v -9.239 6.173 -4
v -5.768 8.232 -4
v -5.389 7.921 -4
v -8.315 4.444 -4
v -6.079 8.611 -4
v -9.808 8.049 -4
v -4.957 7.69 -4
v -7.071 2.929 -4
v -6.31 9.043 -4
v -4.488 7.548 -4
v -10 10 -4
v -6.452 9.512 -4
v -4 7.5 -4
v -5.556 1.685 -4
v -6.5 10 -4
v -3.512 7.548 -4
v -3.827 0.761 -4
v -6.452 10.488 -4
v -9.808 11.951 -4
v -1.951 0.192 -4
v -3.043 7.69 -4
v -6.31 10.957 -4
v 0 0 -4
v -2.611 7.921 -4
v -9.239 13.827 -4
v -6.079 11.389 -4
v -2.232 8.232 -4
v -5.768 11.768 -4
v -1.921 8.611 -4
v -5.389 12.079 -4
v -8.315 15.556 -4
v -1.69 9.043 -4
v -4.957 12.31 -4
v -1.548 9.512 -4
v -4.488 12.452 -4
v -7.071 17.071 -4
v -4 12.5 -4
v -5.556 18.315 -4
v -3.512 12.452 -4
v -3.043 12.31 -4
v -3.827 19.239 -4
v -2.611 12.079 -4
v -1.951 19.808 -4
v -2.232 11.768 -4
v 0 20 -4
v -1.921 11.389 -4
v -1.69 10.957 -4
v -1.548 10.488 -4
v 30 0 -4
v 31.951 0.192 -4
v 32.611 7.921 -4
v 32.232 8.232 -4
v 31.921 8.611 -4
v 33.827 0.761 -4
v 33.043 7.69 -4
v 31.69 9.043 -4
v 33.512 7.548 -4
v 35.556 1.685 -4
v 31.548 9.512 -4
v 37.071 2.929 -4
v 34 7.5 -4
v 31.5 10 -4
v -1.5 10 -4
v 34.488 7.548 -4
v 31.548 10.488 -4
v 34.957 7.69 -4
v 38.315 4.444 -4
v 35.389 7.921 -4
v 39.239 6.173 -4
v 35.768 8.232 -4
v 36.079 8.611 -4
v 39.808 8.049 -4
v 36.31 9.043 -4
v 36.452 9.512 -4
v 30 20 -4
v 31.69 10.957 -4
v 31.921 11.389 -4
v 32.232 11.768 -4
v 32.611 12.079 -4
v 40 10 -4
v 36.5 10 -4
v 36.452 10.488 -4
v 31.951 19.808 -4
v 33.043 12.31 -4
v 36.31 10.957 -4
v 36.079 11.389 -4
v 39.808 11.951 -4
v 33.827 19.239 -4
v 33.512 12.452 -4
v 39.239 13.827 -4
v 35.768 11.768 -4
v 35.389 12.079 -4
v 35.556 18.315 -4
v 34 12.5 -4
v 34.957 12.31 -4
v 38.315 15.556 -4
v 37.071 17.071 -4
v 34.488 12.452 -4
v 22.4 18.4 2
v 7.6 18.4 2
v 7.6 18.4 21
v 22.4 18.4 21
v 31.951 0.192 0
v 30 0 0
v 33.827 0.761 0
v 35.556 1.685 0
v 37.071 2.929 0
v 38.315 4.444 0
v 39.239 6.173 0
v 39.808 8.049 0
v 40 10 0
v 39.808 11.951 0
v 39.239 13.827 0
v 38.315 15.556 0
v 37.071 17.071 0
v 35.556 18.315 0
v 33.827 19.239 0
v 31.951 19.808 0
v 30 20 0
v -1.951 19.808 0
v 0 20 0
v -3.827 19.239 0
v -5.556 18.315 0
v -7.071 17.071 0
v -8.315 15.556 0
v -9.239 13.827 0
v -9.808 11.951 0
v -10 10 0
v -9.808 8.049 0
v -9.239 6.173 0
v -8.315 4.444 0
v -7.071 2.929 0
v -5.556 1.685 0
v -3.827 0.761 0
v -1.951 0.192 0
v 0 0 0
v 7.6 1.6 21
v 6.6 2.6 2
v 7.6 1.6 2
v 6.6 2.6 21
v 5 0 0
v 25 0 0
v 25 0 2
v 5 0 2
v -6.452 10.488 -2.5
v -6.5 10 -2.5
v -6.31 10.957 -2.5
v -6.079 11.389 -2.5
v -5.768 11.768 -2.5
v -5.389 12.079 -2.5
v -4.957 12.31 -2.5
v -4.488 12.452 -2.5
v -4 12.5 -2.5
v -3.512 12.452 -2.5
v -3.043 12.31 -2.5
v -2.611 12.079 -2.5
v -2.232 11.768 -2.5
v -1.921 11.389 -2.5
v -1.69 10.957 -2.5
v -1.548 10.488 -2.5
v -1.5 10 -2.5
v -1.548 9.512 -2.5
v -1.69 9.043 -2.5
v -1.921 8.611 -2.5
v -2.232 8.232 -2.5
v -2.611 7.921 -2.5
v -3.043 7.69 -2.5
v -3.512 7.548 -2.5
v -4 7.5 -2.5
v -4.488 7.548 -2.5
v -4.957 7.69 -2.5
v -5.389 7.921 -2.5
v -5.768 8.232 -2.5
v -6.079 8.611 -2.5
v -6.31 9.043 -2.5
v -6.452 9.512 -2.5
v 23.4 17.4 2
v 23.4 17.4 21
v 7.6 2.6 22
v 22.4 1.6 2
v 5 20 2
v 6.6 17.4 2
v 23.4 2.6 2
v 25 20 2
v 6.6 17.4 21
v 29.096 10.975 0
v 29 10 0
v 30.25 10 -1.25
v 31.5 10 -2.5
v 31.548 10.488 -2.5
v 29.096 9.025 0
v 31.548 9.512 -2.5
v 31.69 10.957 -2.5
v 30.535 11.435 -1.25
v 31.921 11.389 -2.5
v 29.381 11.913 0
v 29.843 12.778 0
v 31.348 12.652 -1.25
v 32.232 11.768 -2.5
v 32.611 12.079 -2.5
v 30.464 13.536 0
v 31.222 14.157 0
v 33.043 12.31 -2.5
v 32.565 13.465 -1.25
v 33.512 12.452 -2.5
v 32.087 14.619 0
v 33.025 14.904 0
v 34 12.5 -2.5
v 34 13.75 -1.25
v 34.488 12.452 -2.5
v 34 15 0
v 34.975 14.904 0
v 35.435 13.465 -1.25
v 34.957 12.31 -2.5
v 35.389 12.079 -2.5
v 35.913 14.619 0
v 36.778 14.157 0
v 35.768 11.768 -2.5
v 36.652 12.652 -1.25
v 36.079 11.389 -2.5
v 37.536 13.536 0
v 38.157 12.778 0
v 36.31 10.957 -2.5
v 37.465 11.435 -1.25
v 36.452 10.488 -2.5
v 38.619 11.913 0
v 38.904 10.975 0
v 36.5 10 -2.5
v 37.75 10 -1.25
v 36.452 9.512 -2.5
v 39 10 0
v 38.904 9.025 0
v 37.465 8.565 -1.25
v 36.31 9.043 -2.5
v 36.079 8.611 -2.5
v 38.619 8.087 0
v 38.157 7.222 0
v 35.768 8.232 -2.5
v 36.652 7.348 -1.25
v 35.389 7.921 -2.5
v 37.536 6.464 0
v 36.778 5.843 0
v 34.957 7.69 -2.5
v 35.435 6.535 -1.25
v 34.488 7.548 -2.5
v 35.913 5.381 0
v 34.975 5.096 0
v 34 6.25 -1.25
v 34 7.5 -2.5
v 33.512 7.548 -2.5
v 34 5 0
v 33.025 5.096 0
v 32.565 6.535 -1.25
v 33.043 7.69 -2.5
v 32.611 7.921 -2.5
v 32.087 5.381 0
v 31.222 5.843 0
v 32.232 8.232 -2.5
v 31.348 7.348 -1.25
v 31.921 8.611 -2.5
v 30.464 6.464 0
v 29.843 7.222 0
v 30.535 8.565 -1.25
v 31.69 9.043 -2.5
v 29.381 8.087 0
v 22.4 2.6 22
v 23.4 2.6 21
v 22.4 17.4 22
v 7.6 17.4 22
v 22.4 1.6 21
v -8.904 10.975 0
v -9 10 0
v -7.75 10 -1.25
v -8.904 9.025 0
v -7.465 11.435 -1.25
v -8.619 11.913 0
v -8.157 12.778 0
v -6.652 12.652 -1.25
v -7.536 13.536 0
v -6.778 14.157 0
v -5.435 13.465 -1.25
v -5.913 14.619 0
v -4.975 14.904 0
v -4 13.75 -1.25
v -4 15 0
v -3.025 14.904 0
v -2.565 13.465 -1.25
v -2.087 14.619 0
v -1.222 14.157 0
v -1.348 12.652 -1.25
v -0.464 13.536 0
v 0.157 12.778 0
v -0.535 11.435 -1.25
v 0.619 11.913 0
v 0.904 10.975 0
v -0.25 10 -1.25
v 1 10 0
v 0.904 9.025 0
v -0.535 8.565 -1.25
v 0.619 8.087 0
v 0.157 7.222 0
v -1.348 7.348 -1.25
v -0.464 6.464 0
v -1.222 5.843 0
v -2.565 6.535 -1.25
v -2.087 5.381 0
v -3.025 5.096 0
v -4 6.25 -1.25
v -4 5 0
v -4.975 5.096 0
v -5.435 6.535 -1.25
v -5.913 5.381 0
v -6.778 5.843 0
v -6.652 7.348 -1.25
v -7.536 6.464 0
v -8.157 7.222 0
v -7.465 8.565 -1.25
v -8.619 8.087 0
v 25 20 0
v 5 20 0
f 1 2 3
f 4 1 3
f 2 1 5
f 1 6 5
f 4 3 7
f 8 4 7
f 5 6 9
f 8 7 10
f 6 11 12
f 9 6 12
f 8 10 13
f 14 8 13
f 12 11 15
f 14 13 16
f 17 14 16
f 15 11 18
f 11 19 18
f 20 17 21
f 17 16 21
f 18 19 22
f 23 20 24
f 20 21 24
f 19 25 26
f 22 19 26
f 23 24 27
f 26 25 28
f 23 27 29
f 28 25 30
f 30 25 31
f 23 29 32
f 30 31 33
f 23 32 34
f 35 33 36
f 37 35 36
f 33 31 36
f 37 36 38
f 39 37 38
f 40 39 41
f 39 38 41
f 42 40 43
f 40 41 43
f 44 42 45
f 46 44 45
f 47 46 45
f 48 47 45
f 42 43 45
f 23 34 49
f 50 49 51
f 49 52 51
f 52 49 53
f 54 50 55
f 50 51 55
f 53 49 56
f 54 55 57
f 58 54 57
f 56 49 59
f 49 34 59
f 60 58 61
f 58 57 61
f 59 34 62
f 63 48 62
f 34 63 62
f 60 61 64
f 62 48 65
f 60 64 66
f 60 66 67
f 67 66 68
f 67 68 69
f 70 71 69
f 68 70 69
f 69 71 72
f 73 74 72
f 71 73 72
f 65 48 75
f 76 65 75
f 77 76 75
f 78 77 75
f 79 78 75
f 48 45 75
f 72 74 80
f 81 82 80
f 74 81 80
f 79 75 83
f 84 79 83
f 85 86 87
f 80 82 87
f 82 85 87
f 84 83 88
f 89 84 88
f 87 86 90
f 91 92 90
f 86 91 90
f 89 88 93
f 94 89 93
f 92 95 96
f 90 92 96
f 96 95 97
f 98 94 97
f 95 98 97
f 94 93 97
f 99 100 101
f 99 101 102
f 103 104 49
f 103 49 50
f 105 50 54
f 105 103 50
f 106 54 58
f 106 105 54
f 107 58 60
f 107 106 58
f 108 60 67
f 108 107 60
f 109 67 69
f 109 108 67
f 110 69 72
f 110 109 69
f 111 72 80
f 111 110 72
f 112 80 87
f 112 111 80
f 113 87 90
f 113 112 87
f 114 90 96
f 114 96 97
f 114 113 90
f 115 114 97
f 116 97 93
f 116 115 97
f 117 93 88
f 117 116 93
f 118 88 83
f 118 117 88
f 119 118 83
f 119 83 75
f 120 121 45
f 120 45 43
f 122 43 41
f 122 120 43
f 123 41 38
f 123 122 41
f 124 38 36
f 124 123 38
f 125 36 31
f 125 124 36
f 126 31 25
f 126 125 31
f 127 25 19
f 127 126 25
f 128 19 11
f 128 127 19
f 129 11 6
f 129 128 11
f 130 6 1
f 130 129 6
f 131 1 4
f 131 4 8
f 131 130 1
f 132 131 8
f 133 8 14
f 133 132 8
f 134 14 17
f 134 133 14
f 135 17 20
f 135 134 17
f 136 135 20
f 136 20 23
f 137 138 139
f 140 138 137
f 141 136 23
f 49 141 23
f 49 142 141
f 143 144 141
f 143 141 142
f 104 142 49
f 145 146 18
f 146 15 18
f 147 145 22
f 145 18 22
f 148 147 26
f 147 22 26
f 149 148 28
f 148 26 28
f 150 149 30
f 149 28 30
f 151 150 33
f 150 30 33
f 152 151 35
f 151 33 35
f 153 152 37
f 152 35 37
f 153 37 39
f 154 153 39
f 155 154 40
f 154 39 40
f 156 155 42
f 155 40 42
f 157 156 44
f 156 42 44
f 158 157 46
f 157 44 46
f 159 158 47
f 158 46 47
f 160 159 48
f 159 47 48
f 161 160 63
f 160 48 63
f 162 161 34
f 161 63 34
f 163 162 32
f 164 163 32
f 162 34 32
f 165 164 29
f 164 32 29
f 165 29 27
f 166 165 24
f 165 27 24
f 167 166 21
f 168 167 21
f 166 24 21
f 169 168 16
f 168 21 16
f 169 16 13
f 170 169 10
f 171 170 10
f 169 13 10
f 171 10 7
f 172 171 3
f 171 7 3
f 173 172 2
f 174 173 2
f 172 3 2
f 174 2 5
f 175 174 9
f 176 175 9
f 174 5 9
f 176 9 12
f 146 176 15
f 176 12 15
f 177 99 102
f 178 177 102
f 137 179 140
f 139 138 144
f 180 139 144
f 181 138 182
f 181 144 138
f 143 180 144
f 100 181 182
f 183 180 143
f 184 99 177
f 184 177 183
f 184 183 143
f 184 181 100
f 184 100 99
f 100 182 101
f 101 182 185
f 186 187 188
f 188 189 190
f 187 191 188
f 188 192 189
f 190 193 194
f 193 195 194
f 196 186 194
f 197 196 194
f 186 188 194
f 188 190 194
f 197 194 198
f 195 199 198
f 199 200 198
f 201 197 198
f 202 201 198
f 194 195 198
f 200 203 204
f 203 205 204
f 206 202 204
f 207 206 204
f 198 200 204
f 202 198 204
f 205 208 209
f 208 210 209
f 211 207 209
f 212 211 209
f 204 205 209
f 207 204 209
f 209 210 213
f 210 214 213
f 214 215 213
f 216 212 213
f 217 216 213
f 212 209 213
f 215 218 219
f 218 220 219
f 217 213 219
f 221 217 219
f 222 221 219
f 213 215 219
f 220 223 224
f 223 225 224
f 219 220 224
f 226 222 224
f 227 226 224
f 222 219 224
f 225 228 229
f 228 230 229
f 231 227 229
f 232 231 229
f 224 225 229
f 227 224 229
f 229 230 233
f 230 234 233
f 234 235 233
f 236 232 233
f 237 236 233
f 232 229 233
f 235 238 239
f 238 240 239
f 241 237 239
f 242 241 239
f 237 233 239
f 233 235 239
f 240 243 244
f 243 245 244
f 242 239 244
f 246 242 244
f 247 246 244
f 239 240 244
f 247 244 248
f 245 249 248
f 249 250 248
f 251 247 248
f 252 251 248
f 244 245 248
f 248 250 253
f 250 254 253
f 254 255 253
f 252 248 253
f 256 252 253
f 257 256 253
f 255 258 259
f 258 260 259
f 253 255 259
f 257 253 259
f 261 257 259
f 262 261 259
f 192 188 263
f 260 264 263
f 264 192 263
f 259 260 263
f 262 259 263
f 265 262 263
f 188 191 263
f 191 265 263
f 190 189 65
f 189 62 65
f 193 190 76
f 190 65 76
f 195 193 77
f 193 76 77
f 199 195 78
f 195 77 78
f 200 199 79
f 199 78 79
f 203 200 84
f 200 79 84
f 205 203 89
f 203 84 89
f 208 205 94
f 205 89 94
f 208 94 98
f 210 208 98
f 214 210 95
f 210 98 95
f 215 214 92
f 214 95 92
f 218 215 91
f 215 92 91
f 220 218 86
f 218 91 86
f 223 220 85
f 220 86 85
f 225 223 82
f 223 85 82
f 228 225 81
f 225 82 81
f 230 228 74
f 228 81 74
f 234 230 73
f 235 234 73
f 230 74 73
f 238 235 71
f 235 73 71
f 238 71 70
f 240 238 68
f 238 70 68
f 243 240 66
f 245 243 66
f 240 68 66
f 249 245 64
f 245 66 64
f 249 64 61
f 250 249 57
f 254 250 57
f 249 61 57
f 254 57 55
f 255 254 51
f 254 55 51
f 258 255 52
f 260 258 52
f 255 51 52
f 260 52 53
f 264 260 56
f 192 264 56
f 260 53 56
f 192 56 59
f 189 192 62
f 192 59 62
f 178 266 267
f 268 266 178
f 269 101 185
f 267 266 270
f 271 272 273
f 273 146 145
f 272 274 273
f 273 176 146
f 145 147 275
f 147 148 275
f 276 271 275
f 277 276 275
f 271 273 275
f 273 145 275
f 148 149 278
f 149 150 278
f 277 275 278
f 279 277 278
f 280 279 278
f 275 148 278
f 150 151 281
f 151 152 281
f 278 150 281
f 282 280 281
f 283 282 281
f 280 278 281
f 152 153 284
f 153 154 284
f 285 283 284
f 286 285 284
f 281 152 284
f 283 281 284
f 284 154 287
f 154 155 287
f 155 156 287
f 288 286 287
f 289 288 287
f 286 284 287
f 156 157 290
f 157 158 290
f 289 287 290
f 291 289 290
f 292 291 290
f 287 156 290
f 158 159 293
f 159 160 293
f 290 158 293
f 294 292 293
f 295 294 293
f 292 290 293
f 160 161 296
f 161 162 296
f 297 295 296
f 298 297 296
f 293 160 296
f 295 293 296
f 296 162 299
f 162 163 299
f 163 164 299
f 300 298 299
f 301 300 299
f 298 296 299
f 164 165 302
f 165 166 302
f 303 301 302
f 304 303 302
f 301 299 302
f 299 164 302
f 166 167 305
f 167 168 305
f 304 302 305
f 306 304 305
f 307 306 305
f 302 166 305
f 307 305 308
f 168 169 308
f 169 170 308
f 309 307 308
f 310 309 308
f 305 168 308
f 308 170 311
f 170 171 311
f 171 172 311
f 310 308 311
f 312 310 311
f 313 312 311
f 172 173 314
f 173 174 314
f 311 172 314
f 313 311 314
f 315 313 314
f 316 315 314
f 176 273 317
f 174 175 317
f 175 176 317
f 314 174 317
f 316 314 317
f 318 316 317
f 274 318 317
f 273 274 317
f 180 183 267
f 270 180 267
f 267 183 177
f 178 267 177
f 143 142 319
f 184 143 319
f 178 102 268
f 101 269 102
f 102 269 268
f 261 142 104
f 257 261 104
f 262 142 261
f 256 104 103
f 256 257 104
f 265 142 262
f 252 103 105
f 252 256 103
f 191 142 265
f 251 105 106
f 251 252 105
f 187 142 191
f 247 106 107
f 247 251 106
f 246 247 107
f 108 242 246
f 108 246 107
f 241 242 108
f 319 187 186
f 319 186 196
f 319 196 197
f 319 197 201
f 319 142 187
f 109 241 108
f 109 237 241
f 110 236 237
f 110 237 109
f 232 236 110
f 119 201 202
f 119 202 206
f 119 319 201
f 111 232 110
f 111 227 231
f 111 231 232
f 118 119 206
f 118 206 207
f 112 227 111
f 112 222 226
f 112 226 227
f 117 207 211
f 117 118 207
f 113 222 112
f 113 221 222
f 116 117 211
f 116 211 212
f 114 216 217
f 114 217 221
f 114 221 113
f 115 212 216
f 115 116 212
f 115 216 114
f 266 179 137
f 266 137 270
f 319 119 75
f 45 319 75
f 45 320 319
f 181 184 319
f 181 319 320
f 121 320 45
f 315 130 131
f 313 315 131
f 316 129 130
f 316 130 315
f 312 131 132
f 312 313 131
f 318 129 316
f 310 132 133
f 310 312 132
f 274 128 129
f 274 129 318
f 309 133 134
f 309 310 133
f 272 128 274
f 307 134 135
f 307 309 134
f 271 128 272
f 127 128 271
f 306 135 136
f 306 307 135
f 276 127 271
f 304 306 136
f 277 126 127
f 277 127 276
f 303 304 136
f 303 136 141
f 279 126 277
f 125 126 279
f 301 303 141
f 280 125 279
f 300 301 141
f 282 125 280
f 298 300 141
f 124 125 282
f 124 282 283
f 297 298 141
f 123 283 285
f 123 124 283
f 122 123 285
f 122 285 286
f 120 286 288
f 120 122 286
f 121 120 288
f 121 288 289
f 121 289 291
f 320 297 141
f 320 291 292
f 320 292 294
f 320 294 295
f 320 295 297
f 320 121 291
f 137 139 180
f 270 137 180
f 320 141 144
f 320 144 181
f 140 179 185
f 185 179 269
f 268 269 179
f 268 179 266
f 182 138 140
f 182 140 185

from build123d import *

# Parameters (mm, degrees)
F0_W           = 20
F0_H           = 20
F1_DEPTH       = 2
F0_W_2         = 5
F2_DEPTH       = 4
F3_W           = 16.8
F3_H           = 16.8
F4_DEPTH       = 20
F5_SIZE        = 1
F6_D           = 5
F6_CSINK_D     = 10
F6_CSINK_ANGLE = 90


with BuildPart() as f1:
    # F0 (on Top) → F1 (new body)
    with BuildSketch(Plane.XY):
        with Locations((15, 10)):
            Rectangle(F0_W, F0_H)
    extrude(amount=F1_DEPTH)

    # F0 (on Top) → F2 (join)
    with BuildSketch(Plane.XY):
        with Locations((2.5, 10)):
            Rectangle(F0_W_2, F0_H)
        with BuildLine():
            ThreePointArc((0, 20), (-10, 10), (0, 0))
            Line((0, 0), (0, 20))
        make_face()
        with Locations((15, 10)):
            Rectangle(F0_W, F0_H)
        with Locations((27.5, 10)):
            Rectangle(F0_W_2, F0_H)
        with BuildLine():
            Line((30, 20), (30, 0))
            ThreePointArc((30, 0), (40, 10), (30, 20))
        make_face()
    extrude(amount=-F2_DEPTH)

    # F3 (on face) → F4 (join)
    with BuildSketch(Plane.XY.offset(2)):
        with Locations((15, 10)):
            Rectangle(F3_W, F3_H)
    extrude(amount=F4_DEPTH)

    # F5
    f5_edges = [f1.edges().sort_by_distance(p)[0] for p in [
        (23.4, 18.4, 12),
        (6.6, 18.4, 12),
        (15, 18.4, 22),
        (6.6, 10, 22),
        (23.4, 10, 22),
        (15, 1.6, 22),
        (23.4, 1.6, 12),
        (6.6, 1.6, 12),
    ]]
    chamfer(f5_edges, length=F5_SIZE)

    # F6 (through all)
    with Locations(Plane.XY):
        with Locations((-4, 10), (34, 10)):
            CounterSinkHole(F6_D / 2, F6_CSINK_D / 2, counter_sink_angle=F6_CSINK_ANGLE)


solid = f1.part
